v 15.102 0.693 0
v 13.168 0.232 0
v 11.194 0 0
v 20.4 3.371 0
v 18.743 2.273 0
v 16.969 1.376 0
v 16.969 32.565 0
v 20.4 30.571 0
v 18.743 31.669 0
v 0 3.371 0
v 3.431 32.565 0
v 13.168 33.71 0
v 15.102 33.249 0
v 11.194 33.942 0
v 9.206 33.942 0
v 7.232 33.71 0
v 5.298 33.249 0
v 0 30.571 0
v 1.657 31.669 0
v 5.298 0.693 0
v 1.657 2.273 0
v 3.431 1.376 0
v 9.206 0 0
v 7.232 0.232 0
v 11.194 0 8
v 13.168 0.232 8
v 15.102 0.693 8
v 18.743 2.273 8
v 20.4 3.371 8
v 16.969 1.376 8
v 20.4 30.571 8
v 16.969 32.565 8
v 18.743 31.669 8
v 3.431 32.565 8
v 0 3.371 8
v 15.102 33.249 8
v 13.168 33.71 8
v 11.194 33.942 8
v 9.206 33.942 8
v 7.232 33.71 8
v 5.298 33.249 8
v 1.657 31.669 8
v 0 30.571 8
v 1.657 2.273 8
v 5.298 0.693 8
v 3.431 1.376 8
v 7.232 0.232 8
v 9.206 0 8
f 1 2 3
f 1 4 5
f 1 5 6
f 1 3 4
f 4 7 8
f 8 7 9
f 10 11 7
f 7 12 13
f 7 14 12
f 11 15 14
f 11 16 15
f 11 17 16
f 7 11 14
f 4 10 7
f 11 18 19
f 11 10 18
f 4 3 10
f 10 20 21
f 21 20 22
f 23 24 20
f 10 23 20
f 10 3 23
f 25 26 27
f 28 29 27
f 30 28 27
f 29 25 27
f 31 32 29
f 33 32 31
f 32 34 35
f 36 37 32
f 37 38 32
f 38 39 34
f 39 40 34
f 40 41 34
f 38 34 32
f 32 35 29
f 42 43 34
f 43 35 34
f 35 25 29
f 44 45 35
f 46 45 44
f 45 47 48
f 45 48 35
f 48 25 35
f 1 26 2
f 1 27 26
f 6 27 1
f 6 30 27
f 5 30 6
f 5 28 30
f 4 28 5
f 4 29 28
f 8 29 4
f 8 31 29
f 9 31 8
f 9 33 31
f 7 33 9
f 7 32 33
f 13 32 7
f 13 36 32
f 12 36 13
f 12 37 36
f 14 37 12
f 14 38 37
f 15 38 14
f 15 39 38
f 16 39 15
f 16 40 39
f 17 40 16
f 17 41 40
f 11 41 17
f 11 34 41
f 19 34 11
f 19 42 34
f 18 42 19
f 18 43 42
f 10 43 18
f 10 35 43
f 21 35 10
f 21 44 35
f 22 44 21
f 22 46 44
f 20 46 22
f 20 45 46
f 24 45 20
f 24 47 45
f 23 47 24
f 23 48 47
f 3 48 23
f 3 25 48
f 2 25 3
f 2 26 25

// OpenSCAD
$fn = 32;

// ----------------------------------------------------------------------
// Eccentric disc: double_d, 8 mm thick
// ----------------------------------------------------------------------

// --- parameters (mm) ---
profile_height = 8;       // extrusion height
profile_points = 24;      // points of the closed outline

profile = [[20.4, 30.571], [18.743, 31.669], [16.969, 32.565], [15.102, 33.249], [13.168, 33.71], [11.194, 33.942], [9.206, 33.942], [7.232, 33.71], [5.298, 33.249], [3.431, 32.565], [1.657, 31.669], [0, 30.571], [0, 3.371], [1.657, 2.273], [3.431, 1.376], [5.298, 0.693], [7.232, 0.232], [9.206, 0], [11.194, 0], [13.168, 0.232], [15.102, 0.693], [16.969, 1.376], [18.743, 2.273], [20.4, 3.371]];  // single closed polygon, 24 points, counter clockwise

// --- the one profile operation ---
linear_extrude(height = profile_height) polygon(points = profile);
